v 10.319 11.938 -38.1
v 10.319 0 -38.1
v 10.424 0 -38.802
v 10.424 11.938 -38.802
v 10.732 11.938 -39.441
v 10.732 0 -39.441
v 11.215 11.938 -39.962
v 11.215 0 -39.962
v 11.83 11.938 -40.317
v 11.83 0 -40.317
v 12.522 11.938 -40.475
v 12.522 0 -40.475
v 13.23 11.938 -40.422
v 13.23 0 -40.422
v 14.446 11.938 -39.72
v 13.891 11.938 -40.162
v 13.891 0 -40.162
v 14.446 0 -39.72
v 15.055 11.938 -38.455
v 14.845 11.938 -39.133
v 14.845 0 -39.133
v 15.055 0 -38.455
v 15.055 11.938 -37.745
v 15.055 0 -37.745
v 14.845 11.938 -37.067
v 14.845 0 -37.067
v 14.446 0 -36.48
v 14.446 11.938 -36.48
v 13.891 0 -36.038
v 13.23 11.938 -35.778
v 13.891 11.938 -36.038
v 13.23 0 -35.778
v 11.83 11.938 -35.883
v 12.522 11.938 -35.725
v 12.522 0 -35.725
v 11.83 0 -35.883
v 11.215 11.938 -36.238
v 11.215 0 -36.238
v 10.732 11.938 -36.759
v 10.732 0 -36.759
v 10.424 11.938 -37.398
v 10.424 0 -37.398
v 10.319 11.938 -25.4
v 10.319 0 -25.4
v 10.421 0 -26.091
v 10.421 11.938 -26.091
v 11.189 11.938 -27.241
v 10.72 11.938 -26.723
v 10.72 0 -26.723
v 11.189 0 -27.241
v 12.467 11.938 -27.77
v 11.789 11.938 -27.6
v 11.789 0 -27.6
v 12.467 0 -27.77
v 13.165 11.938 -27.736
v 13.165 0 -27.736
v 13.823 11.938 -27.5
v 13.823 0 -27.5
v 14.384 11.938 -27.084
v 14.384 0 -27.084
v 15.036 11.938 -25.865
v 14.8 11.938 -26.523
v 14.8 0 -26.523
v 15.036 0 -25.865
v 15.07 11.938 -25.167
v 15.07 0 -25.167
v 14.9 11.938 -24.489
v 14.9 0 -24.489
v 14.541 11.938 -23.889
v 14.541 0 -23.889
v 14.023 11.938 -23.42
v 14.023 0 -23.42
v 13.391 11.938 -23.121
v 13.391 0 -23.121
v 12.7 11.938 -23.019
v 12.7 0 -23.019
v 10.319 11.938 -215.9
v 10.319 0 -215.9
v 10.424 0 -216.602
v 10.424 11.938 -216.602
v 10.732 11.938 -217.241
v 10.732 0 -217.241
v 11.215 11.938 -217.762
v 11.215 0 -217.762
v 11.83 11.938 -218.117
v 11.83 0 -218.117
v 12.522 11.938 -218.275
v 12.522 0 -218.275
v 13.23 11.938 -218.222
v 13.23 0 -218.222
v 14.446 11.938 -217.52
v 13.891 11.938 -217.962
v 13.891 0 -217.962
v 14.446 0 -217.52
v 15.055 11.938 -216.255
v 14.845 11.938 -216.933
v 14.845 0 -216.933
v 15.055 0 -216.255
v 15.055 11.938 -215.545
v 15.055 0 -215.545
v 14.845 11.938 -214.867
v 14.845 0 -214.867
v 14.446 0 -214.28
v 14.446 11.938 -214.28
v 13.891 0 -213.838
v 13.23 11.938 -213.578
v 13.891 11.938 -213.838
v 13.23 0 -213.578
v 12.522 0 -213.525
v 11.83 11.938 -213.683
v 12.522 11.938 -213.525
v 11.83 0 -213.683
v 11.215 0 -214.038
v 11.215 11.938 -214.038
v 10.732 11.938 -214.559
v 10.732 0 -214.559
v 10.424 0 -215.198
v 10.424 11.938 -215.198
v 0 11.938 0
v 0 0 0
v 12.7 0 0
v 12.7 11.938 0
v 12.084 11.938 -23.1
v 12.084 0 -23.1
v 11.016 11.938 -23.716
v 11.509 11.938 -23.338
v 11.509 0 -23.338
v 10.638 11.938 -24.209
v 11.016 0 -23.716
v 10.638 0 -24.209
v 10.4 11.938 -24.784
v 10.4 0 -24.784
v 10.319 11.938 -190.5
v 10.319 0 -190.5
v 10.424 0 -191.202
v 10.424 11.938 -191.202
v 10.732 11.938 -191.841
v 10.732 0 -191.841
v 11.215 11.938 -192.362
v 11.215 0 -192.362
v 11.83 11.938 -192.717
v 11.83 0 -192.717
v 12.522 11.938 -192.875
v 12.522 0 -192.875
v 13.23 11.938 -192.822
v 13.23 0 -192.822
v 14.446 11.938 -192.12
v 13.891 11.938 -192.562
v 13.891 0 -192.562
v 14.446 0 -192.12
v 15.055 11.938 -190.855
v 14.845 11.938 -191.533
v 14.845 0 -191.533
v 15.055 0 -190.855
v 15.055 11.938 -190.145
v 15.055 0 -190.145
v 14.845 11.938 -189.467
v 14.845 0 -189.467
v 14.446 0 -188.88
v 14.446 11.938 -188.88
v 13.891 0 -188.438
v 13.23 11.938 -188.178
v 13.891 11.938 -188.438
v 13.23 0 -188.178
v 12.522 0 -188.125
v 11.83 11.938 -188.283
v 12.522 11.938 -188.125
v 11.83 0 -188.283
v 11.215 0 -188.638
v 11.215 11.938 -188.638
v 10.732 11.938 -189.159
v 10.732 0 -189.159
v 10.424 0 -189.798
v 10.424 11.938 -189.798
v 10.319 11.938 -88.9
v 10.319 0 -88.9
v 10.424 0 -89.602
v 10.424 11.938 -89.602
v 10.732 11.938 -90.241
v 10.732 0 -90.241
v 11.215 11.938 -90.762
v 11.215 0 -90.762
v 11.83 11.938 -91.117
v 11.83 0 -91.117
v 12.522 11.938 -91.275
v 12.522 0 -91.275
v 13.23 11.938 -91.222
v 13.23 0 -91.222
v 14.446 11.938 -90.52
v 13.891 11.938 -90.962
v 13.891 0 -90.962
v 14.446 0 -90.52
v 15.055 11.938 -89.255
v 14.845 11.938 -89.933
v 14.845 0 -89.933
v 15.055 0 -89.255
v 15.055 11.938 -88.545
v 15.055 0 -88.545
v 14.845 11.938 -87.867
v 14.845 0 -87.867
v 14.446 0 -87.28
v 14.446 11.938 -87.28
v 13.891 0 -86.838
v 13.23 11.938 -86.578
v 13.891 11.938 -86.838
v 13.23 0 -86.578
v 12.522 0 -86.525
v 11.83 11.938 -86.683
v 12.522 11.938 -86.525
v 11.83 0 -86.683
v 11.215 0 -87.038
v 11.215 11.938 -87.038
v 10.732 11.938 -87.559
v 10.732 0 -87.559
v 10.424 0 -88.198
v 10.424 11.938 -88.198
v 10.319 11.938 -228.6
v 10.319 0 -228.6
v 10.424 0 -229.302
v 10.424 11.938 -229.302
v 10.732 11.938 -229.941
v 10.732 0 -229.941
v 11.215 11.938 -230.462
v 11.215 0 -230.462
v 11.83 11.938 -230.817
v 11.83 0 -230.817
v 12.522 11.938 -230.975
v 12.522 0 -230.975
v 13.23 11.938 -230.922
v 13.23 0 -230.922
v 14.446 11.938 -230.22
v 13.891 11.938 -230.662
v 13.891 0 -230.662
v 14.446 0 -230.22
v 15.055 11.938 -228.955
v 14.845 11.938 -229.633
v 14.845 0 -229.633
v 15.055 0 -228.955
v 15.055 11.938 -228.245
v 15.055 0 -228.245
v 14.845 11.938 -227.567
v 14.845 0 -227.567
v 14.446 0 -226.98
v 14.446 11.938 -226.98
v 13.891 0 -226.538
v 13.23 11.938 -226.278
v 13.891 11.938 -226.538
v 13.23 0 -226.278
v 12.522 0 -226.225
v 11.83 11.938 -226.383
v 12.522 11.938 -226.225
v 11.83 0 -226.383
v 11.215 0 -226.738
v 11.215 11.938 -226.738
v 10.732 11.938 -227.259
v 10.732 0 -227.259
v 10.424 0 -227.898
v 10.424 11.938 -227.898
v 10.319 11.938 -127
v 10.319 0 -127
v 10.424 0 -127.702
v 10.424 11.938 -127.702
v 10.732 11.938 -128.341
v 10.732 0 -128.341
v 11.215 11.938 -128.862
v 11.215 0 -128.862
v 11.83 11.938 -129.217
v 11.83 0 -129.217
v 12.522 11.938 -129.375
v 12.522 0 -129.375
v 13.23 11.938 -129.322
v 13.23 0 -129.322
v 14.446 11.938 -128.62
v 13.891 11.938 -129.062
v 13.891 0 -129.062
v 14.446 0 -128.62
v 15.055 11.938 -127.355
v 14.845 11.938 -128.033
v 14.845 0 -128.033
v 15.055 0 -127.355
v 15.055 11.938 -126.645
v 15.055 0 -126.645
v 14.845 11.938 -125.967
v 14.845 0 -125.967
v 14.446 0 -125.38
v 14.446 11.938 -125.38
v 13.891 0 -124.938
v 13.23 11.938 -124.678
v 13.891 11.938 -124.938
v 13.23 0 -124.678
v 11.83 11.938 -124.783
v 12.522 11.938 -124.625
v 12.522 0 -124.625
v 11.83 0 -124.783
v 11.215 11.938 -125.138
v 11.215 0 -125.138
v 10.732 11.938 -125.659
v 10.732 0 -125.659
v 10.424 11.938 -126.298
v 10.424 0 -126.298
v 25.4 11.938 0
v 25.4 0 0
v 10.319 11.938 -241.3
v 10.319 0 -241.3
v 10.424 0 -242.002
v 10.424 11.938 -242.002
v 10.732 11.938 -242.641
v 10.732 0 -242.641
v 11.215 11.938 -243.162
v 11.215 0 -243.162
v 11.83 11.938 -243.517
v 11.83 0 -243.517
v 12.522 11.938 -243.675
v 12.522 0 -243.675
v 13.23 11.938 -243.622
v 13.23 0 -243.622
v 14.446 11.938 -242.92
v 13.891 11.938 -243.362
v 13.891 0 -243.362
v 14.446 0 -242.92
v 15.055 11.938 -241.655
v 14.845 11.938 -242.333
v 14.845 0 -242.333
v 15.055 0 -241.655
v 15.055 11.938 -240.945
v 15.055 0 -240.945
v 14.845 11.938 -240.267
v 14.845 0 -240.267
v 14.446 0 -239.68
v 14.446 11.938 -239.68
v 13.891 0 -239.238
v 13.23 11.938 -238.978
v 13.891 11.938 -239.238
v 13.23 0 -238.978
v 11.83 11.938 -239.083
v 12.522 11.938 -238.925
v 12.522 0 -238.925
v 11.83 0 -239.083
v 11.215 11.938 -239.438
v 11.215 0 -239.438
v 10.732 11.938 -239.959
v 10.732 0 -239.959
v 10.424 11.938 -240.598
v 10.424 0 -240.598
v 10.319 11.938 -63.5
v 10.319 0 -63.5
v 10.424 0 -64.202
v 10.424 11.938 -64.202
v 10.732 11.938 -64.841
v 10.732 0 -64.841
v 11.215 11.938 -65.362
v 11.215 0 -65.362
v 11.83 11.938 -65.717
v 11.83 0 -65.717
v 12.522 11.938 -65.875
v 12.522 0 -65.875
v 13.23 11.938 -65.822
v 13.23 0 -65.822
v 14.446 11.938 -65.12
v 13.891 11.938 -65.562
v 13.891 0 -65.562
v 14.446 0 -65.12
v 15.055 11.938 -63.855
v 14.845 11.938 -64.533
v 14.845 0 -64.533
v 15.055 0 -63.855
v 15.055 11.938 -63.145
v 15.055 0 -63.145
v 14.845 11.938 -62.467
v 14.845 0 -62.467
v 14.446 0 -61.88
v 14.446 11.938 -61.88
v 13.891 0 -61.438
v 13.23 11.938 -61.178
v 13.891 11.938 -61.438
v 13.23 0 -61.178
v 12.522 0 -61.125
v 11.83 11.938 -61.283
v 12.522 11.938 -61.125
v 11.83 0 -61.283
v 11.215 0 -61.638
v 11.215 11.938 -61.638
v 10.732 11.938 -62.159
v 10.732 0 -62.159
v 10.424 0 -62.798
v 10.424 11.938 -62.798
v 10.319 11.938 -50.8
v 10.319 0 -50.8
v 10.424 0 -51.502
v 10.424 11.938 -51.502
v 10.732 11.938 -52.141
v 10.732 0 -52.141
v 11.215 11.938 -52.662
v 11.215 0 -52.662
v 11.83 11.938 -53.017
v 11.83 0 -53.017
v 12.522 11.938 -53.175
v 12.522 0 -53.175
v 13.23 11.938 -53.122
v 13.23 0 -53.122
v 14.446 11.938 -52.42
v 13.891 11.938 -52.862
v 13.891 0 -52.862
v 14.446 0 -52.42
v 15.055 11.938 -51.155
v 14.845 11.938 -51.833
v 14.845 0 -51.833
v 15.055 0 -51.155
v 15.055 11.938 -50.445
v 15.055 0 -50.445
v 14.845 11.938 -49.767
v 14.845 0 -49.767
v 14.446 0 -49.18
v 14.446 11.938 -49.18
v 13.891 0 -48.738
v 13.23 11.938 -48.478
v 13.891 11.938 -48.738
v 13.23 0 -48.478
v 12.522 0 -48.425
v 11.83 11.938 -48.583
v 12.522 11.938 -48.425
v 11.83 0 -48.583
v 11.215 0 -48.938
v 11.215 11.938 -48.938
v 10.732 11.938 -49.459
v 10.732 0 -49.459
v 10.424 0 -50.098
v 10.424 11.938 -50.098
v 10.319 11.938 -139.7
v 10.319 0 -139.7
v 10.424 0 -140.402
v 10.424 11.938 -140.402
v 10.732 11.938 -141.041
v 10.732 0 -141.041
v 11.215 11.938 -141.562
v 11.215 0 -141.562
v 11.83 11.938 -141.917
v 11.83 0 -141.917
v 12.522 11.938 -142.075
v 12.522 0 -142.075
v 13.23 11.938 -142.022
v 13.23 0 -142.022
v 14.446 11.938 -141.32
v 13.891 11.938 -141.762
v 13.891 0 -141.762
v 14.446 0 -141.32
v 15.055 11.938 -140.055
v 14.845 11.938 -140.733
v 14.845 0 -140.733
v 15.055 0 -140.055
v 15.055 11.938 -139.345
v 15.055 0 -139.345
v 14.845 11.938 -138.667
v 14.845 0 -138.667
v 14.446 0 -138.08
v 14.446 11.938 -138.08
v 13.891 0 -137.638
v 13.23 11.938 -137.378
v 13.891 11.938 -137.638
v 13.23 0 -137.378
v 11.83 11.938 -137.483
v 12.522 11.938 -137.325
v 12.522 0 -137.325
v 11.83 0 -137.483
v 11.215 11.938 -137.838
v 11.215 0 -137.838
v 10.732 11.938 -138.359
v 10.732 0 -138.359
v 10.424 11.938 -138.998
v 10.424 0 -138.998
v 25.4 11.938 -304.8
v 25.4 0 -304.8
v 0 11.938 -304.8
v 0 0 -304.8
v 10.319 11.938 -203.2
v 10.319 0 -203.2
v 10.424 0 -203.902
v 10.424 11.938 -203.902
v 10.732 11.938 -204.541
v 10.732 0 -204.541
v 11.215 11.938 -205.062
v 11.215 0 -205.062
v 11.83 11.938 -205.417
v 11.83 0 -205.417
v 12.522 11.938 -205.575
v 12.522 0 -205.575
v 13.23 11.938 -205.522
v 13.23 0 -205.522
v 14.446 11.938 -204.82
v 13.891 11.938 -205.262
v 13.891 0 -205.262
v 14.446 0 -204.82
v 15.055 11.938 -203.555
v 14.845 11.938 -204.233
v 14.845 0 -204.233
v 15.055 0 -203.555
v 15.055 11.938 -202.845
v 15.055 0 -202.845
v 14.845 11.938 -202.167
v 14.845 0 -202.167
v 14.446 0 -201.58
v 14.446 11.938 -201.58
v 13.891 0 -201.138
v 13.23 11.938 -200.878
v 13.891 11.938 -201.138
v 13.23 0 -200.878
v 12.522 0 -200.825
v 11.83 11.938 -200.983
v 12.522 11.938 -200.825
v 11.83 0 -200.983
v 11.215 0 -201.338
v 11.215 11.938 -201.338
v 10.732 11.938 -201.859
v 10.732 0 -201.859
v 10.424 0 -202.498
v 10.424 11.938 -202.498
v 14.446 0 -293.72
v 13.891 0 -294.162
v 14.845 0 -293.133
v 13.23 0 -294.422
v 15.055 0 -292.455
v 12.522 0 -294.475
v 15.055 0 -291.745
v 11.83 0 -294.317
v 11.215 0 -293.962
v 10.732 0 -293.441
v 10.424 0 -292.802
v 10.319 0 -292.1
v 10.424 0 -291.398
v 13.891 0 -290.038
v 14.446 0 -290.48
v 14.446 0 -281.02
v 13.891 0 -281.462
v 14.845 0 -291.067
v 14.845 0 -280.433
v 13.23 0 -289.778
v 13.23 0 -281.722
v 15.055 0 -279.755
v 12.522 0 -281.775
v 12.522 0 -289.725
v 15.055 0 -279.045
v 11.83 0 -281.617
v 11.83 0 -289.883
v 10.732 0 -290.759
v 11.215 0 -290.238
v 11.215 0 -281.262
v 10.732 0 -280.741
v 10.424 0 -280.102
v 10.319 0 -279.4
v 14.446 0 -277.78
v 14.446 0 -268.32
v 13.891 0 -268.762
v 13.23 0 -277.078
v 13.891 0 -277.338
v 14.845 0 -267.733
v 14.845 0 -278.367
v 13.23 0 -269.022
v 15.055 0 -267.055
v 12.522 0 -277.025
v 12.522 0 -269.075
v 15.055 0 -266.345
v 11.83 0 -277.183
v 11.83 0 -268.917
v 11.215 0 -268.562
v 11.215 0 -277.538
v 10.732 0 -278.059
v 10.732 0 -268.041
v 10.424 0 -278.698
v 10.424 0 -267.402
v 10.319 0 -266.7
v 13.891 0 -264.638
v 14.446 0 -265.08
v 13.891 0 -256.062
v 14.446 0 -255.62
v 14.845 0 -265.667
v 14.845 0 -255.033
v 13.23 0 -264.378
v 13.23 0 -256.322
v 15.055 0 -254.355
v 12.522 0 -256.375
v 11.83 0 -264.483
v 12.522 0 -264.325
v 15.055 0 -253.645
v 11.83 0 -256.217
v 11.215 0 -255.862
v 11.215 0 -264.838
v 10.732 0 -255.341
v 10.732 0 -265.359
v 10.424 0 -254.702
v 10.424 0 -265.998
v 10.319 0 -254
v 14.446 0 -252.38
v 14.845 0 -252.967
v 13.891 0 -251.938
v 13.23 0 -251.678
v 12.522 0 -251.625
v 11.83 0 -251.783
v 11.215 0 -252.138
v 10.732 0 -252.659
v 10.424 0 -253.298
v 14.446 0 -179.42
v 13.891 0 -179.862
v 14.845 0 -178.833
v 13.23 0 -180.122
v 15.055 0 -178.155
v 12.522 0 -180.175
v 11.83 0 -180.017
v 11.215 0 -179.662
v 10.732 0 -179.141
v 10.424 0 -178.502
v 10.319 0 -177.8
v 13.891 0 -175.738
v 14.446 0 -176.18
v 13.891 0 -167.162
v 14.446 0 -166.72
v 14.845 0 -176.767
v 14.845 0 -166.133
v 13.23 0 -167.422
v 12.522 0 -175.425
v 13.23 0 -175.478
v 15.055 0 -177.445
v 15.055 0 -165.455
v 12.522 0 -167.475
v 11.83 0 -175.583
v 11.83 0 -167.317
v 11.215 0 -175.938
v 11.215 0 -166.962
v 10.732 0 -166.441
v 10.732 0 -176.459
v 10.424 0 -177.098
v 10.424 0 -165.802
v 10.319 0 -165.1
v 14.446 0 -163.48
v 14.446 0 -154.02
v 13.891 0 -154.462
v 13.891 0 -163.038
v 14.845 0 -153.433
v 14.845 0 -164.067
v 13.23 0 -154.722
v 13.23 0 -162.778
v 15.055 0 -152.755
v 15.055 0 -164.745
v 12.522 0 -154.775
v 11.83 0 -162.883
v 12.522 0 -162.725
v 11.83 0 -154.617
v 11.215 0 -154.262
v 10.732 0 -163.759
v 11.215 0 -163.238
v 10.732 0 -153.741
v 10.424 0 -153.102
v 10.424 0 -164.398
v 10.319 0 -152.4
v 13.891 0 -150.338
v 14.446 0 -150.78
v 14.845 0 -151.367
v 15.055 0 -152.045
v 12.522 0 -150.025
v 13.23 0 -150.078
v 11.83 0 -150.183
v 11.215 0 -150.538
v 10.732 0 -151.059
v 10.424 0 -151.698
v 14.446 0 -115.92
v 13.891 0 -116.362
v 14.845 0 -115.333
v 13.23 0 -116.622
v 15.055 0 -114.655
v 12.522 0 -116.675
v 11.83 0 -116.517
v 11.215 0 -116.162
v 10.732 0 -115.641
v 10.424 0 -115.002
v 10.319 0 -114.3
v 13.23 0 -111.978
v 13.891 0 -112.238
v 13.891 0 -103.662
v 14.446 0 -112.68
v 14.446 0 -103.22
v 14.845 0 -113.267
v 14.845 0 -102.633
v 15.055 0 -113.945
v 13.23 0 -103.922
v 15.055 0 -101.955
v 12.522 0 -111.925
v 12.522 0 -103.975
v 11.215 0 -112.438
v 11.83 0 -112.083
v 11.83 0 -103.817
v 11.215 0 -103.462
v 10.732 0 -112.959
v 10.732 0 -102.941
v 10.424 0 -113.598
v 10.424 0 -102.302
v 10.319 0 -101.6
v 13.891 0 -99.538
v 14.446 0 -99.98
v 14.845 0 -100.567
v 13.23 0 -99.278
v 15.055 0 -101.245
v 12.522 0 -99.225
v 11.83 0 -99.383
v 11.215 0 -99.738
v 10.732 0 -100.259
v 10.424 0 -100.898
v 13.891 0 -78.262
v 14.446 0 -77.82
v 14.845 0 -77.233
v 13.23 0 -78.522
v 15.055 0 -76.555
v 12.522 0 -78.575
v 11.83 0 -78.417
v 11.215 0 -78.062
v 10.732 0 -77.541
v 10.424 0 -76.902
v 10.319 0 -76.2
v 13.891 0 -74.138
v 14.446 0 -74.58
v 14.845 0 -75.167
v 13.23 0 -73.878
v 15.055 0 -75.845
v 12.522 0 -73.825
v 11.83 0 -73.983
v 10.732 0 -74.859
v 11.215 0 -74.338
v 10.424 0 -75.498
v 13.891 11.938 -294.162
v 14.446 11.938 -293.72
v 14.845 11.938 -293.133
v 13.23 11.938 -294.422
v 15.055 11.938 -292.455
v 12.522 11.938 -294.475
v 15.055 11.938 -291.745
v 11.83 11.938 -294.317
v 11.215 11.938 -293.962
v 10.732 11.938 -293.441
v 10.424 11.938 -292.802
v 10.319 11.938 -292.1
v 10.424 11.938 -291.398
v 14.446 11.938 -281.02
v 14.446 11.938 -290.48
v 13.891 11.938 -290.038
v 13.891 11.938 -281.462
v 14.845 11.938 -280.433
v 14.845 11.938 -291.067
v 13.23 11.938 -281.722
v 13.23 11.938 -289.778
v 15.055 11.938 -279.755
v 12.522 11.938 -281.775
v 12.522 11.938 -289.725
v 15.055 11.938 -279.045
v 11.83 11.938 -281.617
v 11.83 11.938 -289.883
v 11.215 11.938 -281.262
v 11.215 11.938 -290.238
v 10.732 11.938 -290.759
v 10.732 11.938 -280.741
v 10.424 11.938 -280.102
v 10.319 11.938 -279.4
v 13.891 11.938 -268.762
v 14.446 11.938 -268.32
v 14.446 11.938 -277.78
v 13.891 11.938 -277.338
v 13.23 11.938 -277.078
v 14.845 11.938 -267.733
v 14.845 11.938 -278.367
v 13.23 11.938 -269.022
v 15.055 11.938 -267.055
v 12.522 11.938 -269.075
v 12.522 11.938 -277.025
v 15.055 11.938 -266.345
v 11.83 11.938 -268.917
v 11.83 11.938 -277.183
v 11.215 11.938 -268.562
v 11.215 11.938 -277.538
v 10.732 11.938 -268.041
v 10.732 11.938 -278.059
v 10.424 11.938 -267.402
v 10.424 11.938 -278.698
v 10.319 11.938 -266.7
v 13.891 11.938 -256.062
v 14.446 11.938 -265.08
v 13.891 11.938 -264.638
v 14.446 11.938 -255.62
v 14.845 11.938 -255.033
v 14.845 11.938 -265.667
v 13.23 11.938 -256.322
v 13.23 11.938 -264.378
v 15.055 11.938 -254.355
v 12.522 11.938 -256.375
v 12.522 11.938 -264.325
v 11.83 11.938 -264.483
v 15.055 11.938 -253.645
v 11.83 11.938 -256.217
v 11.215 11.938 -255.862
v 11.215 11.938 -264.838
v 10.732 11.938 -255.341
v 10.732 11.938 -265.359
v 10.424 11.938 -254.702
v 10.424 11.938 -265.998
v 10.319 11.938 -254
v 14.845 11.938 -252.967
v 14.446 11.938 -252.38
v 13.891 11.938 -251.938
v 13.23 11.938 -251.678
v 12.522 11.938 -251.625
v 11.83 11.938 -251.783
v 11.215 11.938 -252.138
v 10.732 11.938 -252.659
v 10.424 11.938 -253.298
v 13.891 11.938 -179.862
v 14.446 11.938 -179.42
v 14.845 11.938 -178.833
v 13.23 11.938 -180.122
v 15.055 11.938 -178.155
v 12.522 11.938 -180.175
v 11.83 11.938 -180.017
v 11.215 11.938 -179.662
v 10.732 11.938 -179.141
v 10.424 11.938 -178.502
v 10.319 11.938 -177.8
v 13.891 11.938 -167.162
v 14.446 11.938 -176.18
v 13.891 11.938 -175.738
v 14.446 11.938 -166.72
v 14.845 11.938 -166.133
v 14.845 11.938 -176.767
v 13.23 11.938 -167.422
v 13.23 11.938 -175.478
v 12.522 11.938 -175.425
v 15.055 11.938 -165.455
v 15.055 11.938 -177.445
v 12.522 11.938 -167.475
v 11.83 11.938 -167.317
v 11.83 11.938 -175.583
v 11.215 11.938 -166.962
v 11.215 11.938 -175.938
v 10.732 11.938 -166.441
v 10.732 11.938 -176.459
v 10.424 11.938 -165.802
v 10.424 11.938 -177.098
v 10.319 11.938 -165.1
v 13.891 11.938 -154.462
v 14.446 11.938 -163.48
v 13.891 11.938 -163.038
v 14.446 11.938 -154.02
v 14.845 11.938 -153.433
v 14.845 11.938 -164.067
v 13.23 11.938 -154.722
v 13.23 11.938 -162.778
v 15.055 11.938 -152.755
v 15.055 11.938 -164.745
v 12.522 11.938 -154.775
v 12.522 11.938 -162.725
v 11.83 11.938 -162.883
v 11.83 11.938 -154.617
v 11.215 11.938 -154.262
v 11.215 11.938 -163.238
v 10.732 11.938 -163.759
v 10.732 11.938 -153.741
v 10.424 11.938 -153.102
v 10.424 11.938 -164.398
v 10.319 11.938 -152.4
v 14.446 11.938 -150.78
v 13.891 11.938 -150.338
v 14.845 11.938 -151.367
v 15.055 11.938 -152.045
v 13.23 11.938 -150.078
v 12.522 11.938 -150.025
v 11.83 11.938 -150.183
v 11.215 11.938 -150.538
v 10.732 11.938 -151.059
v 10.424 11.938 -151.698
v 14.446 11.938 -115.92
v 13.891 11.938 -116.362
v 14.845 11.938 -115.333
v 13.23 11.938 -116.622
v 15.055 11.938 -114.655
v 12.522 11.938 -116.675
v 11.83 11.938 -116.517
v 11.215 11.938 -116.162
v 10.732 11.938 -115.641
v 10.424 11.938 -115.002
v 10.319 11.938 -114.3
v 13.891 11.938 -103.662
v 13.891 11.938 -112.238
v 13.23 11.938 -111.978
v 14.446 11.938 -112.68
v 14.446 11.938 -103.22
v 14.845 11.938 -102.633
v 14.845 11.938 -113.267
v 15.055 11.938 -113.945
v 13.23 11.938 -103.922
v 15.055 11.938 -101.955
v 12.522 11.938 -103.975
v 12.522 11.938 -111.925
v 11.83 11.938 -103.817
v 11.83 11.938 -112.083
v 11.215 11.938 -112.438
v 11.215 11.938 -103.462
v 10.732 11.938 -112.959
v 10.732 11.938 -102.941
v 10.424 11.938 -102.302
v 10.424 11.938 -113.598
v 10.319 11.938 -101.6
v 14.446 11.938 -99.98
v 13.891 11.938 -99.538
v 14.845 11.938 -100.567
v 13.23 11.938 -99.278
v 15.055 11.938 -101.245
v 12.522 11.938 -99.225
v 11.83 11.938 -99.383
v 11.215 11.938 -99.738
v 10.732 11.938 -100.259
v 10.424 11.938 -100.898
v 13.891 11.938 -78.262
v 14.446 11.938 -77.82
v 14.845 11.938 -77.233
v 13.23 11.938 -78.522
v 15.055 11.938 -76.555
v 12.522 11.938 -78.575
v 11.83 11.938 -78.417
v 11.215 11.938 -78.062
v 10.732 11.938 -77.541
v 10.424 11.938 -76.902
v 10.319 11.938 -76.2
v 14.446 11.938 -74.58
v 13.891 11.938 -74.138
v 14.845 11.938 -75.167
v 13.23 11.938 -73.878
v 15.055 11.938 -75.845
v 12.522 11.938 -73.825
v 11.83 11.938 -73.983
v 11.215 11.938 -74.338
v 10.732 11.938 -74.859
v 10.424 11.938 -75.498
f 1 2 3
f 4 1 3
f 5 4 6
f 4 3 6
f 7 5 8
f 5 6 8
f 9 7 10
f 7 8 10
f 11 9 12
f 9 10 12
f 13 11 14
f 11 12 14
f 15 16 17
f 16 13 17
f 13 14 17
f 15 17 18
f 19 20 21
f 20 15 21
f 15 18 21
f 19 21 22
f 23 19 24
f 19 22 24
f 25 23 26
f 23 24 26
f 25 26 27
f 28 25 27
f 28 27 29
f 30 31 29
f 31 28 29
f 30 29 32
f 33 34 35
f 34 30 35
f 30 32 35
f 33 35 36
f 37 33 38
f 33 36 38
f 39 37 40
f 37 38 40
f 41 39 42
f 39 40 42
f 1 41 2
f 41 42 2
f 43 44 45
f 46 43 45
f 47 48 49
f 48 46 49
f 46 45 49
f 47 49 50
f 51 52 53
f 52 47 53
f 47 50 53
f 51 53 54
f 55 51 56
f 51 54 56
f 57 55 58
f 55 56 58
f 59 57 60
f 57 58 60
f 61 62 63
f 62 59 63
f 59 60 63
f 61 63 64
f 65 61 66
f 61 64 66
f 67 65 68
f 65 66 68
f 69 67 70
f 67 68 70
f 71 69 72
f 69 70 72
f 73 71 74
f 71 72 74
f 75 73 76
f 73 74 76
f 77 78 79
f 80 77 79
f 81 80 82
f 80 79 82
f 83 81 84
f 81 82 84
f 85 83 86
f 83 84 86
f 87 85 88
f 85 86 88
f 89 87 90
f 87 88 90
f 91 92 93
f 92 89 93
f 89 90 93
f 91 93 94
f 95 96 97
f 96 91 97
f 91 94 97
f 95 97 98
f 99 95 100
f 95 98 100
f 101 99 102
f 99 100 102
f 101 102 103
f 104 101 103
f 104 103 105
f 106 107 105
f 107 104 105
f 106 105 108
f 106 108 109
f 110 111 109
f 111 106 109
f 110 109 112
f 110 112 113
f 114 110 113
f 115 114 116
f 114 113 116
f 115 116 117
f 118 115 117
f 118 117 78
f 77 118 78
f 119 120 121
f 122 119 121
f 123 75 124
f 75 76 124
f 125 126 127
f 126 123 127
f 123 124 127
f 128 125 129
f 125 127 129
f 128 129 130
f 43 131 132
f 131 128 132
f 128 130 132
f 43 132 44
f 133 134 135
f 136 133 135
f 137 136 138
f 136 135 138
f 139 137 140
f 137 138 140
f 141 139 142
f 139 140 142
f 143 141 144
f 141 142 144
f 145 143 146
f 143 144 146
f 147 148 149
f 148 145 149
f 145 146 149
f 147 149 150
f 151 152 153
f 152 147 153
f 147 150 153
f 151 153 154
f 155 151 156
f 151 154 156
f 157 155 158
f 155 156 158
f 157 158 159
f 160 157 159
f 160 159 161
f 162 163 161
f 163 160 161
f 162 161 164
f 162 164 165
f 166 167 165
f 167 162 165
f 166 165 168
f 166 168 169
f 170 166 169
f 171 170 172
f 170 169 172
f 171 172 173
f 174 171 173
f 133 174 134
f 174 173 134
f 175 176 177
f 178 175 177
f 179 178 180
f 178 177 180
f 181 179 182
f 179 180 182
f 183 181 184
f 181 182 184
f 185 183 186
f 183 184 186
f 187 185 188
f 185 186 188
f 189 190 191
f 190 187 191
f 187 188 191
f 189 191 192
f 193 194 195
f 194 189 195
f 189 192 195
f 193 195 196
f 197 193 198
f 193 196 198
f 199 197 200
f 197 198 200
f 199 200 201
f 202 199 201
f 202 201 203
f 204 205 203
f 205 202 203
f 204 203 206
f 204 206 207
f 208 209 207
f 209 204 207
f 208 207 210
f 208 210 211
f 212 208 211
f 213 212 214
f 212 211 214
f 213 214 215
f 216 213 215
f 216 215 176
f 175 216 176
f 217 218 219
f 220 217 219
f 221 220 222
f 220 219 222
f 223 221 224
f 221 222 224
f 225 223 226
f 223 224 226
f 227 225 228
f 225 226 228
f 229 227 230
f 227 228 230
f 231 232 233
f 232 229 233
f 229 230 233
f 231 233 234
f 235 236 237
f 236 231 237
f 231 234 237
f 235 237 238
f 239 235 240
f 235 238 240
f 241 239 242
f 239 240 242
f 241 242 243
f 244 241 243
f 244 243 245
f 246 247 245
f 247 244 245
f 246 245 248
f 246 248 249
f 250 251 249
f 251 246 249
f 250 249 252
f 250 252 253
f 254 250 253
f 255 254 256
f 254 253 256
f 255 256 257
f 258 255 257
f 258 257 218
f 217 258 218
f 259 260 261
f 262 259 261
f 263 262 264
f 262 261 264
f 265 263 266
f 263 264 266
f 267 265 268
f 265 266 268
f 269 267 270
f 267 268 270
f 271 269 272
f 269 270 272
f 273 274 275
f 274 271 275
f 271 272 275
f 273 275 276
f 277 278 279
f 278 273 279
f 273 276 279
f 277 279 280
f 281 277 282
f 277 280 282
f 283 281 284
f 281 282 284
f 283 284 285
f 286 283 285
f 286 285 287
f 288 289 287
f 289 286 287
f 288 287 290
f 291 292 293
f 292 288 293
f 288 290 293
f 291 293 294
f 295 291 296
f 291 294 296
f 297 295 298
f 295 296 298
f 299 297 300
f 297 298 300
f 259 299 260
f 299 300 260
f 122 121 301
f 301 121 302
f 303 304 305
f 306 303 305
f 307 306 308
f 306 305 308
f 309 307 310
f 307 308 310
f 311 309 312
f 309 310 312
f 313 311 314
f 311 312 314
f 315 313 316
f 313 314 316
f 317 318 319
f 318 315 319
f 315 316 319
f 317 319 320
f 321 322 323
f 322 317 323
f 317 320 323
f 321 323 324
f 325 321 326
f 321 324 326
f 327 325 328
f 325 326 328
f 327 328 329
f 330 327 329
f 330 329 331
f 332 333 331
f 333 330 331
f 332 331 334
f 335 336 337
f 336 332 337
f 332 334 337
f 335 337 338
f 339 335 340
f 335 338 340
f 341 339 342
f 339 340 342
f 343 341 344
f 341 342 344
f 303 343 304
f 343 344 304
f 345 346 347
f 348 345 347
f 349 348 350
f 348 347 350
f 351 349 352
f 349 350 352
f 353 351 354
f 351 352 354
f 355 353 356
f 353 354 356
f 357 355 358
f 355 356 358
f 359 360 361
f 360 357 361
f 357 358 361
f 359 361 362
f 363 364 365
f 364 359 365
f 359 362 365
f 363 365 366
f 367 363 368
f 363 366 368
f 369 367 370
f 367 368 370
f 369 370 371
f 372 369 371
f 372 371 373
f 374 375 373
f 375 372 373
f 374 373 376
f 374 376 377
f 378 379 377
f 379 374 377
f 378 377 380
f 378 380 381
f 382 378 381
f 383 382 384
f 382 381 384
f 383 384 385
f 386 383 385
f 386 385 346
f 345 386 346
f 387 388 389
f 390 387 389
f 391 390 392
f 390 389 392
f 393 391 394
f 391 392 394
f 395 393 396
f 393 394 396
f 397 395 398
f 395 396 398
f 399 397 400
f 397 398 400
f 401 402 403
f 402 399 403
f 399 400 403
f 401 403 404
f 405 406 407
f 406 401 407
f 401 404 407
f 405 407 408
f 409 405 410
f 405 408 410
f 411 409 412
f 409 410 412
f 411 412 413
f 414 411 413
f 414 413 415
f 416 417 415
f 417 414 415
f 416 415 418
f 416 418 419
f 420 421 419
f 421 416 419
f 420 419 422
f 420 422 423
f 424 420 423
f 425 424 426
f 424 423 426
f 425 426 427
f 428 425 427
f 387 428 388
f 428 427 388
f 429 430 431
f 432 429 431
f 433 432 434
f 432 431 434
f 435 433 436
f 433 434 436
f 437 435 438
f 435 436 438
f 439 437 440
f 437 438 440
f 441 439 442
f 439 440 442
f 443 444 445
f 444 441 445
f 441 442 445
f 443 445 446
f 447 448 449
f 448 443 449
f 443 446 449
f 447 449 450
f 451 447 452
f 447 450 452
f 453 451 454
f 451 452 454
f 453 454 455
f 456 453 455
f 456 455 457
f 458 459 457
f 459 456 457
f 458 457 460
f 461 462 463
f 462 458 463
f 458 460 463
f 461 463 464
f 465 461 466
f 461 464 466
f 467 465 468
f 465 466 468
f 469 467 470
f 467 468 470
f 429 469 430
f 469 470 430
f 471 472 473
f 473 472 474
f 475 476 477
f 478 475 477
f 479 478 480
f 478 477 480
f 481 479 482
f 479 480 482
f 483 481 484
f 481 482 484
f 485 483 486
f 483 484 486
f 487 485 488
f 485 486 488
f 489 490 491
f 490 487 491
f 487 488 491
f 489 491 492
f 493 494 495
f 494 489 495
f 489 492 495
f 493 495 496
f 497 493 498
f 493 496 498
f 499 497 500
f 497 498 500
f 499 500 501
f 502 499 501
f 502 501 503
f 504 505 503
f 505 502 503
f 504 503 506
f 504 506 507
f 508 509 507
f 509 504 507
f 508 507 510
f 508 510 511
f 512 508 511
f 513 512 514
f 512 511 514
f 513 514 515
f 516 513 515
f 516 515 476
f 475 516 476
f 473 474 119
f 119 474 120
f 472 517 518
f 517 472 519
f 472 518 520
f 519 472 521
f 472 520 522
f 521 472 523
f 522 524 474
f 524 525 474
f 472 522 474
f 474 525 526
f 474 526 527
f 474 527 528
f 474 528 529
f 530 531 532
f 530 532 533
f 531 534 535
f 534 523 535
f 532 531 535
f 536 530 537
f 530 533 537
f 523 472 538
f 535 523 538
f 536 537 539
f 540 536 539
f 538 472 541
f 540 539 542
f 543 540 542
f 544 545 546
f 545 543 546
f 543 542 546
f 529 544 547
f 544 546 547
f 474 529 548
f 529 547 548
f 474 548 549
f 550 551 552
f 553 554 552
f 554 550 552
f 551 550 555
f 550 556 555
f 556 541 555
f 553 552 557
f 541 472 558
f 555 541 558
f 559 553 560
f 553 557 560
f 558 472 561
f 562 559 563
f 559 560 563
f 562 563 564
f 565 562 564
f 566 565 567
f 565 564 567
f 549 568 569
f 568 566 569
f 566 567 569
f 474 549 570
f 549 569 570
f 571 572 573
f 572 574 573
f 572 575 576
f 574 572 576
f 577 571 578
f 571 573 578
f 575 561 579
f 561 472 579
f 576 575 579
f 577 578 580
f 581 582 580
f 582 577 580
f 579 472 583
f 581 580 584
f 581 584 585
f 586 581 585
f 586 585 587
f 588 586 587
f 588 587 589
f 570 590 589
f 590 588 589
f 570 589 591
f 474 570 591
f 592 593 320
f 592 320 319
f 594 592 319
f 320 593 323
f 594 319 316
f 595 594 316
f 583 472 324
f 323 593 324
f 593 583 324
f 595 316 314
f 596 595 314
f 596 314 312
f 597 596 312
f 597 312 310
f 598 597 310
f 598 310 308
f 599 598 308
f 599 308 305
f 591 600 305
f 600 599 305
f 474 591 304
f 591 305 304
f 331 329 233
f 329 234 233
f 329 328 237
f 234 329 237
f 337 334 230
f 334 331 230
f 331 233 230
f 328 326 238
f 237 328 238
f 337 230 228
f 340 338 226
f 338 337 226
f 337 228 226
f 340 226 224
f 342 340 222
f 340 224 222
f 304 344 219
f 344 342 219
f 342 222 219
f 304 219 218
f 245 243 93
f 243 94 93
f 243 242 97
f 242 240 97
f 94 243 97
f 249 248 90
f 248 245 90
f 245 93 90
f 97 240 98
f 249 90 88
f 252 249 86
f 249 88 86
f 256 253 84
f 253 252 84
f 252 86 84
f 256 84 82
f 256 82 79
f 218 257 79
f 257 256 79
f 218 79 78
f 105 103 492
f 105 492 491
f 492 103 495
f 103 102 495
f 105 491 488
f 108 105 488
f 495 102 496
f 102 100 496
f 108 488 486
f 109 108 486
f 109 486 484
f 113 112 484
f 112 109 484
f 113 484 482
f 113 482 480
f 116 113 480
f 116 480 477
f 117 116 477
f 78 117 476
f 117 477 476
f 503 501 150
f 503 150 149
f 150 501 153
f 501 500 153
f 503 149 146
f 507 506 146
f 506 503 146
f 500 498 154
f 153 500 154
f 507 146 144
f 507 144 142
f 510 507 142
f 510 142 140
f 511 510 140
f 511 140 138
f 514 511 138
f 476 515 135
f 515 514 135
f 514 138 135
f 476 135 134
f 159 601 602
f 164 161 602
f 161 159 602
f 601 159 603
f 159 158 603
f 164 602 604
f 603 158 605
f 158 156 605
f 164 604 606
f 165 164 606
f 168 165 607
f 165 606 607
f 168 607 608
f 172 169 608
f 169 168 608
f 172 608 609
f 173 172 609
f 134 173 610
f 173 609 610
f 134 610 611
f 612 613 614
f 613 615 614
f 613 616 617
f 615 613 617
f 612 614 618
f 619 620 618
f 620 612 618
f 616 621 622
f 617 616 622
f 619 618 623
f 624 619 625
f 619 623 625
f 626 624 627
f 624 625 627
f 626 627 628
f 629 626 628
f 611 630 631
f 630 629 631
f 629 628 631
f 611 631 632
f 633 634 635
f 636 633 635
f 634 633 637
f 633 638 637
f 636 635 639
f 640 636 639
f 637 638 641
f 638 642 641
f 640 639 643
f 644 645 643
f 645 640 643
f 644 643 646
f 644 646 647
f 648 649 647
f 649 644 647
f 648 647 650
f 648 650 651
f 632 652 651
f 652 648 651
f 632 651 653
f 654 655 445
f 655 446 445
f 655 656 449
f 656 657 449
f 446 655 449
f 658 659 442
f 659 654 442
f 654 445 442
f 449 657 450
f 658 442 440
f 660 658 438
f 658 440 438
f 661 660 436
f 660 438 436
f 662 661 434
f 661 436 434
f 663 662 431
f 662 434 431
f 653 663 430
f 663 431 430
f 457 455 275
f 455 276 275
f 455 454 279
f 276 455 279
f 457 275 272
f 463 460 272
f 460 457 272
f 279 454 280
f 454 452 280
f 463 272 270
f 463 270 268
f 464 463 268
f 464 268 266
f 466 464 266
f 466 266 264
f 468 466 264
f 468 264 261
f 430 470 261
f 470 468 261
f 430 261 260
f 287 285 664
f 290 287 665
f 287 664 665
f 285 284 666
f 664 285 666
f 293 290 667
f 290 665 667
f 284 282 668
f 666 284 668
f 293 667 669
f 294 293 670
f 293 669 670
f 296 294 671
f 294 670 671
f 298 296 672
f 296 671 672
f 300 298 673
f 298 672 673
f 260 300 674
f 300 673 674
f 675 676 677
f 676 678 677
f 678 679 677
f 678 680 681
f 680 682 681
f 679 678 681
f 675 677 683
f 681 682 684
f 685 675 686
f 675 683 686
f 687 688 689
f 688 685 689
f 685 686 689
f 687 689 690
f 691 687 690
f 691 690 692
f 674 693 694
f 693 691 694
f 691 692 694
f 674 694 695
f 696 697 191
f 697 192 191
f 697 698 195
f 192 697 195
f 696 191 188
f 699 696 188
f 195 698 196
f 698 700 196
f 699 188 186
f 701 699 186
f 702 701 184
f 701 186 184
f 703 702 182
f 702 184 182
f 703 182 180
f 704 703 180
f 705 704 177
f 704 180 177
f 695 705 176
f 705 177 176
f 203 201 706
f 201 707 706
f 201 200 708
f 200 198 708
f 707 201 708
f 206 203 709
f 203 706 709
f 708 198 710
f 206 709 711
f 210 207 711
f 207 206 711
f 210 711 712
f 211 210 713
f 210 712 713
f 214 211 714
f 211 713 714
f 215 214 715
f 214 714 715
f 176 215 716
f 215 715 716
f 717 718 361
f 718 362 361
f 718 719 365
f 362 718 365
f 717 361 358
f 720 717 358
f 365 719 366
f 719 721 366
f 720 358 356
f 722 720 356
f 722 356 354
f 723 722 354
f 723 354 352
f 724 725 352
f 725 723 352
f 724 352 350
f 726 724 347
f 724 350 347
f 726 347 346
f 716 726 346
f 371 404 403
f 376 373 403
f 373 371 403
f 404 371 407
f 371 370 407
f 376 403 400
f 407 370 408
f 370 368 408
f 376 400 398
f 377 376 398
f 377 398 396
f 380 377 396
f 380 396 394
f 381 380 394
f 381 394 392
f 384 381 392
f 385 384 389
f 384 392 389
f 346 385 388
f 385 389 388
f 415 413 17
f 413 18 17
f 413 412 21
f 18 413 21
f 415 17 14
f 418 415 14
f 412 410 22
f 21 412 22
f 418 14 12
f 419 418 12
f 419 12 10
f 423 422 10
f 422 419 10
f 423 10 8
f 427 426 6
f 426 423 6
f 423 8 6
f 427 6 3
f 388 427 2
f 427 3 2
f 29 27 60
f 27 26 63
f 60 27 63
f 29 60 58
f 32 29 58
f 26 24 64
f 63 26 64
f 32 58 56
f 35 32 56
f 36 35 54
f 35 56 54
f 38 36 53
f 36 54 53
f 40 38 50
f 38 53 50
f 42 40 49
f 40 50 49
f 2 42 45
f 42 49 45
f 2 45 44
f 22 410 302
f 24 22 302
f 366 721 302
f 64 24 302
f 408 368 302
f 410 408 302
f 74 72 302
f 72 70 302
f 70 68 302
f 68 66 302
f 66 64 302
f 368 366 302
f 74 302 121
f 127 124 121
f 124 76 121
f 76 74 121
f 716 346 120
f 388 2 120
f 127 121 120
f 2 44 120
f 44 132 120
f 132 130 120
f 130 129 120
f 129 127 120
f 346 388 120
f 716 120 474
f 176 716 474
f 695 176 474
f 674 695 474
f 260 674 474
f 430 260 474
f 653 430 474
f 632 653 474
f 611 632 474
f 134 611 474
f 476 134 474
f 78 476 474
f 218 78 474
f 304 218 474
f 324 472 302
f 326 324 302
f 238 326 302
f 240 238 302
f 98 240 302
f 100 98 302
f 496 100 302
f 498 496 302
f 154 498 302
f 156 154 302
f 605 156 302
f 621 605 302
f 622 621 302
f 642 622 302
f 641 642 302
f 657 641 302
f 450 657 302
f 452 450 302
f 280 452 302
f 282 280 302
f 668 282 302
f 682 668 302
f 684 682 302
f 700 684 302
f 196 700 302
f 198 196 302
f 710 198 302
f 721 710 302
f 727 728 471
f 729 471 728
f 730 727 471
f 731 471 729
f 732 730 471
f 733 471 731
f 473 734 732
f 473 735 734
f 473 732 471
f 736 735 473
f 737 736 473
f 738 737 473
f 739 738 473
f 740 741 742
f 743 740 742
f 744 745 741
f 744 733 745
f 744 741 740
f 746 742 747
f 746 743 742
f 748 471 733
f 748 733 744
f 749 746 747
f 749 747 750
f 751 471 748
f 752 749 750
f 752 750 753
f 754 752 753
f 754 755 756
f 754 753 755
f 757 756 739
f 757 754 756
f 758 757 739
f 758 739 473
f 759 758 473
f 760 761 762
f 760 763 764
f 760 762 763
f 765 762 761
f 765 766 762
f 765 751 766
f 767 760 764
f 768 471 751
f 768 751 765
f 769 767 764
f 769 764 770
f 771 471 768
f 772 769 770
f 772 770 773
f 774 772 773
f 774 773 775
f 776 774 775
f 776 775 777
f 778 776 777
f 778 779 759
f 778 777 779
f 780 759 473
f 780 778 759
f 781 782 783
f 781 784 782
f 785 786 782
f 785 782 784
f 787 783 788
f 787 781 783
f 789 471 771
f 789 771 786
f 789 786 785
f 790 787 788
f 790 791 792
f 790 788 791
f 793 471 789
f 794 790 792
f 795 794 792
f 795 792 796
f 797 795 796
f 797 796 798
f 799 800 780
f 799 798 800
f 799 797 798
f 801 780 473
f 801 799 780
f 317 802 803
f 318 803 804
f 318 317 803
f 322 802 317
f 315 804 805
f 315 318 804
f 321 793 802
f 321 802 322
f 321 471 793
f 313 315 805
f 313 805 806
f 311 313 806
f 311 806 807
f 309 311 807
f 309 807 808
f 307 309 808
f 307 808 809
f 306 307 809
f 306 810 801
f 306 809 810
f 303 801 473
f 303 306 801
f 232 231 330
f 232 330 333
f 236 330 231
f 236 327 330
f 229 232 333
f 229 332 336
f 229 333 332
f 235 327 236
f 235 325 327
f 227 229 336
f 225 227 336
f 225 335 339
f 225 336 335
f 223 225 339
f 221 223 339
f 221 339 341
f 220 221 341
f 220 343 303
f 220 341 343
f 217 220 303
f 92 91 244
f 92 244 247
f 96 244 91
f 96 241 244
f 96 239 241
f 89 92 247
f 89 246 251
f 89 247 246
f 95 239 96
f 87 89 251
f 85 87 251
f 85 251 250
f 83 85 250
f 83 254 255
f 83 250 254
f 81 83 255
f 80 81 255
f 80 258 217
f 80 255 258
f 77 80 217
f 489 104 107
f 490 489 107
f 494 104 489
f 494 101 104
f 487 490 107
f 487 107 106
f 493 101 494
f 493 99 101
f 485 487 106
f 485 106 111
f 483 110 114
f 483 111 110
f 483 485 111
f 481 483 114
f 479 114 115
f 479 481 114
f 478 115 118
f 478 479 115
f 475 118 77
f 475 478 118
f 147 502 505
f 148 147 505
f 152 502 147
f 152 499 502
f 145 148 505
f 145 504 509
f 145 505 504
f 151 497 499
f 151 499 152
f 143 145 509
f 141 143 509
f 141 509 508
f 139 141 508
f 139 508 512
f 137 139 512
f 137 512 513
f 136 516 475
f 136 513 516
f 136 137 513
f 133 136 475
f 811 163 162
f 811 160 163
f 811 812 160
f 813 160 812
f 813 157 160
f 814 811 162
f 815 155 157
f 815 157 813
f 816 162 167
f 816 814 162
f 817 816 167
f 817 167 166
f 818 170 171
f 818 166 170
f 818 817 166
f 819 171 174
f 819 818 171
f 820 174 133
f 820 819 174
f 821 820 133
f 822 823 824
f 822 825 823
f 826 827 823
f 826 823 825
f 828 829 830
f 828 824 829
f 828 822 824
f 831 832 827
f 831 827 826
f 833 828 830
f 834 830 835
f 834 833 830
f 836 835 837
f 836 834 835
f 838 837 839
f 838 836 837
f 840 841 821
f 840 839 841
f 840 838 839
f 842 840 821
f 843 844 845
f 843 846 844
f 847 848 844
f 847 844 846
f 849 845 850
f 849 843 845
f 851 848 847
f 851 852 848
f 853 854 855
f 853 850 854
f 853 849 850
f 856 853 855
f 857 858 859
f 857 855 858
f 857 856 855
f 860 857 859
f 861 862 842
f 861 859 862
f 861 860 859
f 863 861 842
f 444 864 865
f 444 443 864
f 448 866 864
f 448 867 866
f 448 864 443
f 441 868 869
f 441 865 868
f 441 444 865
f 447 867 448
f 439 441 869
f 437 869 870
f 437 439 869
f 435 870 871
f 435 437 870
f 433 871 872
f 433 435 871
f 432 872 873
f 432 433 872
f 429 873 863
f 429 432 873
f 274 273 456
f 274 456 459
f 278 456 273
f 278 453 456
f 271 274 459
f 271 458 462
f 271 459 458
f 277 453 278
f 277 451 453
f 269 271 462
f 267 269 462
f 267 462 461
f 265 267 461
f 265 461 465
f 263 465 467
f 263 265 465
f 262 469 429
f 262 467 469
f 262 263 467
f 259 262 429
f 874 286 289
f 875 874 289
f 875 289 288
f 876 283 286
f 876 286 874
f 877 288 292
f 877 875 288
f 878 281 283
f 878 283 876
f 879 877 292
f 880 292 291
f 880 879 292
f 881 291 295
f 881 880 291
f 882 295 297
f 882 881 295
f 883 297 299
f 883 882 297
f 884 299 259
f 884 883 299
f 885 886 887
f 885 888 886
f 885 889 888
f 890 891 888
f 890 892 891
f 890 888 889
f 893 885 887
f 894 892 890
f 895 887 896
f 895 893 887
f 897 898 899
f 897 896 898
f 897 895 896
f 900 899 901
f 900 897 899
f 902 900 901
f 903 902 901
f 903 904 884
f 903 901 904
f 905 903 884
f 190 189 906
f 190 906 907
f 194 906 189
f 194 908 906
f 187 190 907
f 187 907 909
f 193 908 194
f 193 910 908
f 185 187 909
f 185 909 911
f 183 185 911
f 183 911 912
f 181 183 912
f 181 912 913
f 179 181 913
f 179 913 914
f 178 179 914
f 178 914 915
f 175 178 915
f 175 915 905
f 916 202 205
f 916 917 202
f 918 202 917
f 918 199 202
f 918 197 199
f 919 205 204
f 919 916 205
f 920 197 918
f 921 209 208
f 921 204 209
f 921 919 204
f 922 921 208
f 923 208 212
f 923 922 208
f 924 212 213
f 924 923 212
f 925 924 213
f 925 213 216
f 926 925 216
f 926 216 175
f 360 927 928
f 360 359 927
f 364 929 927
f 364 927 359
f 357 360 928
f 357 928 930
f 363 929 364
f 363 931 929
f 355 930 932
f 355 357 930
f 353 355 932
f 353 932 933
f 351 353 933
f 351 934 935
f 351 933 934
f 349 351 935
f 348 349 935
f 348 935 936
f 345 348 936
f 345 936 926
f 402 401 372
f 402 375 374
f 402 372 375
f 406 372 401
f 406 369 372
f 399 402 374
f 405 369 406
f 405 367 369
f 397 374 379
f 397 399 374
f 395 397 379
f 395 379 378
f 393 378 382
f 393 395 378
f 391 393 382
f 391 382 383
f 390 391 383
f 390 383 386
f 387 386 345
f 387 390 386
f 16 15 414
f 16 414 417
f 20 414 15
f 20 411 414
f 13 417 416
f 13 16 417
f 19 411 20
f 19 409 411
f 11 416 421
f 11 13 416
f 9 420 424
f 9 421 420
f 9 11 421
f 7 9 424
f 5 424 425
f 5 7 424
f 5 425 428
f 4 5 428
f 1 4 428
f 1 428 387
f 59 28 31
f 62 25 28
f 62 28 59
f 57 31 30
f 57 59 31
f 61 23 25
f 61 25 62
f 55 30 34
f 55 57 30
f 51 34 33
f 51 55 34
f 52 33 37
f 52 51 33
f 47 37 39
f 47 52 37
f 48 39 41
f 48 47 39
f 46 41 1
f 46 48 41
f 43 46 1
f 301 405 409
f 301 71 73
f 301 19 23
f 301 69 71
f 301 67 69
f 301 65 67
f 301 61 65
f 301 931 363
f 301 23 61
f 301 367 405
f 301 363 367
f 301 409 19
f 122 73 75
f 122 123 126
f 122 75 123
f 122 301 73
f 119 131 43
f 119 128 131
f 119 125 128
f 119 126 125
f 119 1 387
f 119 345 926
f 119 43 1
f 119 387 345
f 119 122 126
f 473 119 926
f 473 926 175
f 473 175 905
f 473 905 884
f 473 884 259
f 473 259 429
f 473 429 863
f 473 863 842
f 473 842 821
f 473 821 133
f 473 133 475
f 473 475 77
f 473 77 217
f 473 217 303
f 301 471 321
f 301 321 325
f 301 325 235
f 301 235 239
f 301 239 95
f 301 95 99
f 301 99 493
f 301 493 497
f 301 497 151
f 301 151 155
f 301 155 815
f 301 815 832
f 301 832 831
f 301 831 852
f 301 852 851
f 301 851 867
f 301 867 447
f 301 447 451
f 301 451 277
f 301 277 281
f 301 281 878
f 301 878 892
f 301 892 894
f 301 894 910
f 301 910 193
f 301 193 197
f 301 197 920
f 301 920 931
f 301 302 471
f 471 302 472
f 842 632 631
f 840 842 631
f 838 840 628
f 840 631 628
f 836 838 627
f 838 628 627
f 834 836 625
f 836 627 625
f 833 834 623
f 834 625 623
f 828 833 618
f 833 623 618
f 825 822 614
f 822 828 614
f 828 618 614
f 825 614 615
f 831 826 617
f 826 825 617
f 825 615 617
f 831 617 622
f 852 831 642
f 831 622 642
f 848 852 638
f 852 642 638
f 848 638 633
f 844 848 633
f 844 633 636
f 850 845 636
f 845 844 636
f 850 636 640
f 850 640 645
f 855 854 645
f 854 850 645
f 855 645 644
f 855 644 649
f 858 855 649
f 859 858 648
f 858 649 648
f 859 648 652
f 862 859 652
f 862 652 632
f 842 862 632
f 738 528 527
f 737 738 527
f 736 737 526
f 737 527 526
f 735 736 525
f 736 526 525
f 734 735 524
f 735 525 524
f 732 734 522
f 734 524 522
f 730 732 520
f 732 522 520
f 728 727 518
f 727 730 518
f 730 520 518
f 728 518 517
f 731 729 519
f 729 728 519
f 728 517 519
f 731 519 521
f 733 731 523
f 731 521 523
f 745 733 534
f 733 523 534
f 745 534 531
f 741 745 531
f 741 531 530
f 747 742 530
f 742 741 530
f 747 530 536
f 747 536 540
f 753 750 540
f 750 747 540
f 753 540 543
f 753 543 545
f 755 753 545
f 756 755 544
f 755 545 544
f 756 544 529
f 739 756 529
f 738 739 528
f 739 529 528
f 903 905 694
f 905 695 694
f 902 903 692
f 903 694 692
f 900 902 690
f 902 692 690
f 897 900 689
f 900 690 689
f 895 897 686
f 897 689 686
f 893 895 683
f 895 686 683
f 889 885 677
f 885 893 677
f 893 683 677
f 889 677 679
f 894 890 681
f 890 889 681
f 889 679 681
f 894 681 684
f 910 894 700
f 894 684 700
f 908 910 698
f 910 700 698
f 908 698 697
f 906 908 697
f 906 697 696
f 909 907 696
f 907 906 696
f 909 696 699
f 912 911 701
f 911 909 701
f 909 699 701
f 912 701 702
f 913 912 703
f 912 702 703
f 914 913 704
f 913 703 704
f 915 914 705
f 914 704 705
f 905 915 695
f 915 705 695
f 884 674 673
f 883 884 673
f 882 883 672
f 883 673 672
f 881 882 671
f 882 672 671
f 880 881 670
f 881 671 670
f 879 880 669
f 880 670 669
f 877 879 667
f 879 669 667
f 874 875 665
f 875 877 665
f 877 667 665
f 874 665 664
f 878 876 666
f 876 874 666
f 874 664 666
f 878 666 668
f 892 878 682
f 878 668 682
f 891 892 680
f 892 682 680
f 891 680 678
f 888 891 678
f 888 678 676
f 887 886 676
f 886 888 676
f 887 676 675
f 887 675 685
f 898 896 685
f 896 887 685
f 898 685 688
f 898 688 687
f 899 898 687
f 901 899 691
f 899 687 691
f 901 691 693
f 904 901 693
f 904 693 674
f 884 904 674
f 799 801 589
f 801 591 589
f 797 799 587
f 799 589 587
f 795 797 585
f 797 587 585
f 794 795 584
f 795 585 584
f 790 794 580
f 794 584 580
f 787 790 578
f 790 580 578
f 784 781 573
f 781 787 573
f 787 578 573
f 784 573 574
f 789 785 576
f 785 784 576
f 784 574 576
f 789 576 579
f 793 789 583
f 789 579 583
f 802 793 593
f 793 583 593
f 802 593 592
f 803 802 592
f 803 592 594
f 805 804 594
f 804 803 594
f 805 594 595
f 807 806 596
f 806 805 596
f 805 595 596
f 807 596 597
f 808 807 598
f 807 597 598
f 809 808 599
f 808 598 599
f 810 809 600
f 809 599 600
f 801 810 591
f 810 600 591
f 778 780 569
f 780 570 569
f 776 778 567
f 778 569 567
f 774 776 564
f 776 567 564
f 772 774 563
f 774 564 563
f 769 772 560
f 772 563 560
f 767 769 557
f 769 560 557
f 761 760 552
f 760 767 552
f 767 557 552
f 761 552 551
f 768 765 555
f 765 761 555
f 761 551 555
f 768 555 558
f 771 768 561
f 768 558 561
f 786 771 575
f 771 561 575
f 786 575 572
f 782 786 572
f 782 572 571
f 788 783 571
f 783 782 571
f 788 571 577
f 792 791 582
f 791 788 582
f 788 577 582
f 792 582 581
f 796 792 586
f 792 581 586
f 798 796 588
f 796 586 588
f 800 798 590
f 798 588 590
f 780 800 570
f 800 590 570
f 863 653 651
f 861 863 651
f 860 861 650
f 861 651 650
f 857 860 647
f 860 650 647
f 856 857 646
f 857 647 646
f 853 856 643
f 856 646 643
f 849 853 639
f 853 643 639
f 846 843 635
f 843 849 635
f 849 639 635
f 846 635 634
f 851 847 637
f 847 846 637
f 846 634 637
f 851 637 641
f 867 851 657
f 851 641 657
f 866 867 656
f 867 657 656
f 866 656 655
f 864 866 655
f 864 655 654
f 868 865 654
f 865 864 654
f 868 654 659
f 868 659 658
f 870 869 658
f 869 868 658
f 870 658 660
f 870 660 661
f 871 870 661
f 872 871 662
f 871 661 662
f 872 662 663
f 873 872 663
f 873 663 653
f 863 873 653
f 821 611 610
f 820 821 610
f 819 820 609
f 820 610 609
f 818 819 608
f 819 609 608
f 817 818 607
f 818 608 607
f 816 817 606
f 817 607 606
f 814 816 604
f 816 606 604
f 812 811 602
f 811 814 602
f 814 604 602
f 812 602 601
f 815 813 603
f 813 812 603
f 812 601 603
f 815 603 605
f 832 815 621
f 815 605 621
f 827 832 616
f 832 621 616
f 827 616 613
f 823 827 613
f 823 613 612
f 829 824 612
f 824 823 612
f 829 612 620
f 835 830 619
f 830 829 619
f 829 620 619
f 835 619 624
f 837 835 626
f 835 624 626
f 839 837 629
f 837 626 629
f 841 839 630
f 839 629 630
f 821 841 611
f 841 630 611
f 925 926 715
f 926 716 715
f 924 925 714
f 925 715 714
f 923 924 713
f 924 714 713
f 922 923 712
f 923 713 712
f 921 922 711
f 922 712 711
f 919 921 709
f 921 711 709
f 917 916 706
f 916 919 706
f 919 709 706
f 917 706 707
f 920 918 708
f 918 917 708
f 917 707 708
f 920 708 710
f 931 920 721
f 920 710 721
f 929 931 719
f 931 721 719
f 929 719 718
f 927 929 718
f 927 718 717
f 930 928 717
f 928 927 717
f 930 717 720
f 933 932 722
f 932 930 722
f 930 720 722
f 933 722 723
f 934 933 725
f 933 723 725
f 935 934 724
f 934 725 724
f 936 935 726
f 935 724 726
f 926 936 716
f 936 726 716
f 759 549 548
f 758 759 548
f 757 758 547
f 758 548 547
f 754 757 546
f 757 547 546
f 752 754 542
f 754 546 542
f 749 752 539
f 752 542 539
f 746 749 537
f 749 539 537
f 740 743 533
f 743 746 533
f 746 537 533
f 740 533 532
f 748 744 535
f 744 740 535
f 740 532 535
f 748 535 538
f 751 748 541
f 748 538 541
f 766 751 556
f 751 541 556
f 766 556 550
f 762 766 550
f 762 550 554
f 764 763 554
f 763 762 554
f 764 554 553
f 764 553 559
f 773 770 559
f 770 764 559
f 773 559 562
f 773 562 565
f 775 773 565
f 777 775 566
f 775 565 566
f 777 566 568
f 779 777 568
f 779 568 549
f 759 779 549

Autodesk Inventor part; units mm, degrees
ref_plane "YZ Plane" through (0, 0, 0) normal (1, 0, 0) x (0, 1, 0)
ref_plane "XZ Plane" through (0, 0, 0) normal (0, 1, 0) x (-1, 0, 0)
ref_plane "XY Plane" through (0, 0, 0) normal (0, 0, 1) x (1, 0, 0)
sketch "Sketch1" plane through (0, 0, 0) normal (0, 1, 0) x (-1, 0, 0)
  line L0 (0, 0) -> (-25.4, 0)
  line L1 (-25.4, 0) -> (-25.4, -304.8)
  line L2 (-25.4, -304.8) -> (0, -304.8)
  line L3 (0, -304.8) -> (0, 0)
  line L4 (-12.7, 0) -> (-12.7, -304.8) construction
  line L5 (-12.7, 0) -> (-12.7, -25.4)
  line L6 (-12.7, 0) -> (12.7, 0) construction
  circle A0 centre (-12.7, -25.4) radius 2.3813
  circle A1 centre (-12.7, -38.1) radius 2.3813
  circle A2 centre (-12.7, -50.8) radius 2.3813
  circle A3 centre (-12.7, -63.5) radius 2.3813
  circle A4 centre (-12.7, -76.2) radius 2.3813
  circle A5 centre (-12.7, -88.9) radius 2.3813
  circle A6 centre (-12.7, -101.6) radius 2.3813
  circle A7 centre (-12.7, -114.3) radius 2.3813
  circle A8 centre (-12.7, -127) radius 2.3813
  circle A9 centre (-12.7, -139.7) radius 2.3813
  circle A10 centre (-12.7, -152.4) radius 2.3813
  circle A11 centre (-12.7, -165.1) radius 2.3813
  circle A12 centre (-12.7, -177.8) radius 2.3813
  circle A13 centre (-12.7, -190.5) radius 2.3813
  circle A14 centre (-12.7, -203.2) radius 2.3813
  circle A15 centre (-12.7, -215.9) radius 2.3813
  circle A16 centre (-12.7, -228.6) radius 2.3813
  circle A17 centre (-12.7, -241.3) radius 2.3813
  circle A18 centre (-12.7, -254) radius 2.3813
  circle A19 centre (-12.7, -266.7) radius 2.3813
  circle A20 centre (-12.7, -279.4) radius 2.3813
  circle A21 centre (-12.7, -292.1) radius 2.3813
  dimension "d0" = 25.4
  dimension "d1" = 304.8
  dimension "d2" = 25.4
  dimension "d3" = 90
  dimension "d4" = 4.7625
  dimension "d16" = 12.7
extrude "Extrusion2" add sketch "Sketch1" along normal blind 11.938
properties part number "pincer2.0"
